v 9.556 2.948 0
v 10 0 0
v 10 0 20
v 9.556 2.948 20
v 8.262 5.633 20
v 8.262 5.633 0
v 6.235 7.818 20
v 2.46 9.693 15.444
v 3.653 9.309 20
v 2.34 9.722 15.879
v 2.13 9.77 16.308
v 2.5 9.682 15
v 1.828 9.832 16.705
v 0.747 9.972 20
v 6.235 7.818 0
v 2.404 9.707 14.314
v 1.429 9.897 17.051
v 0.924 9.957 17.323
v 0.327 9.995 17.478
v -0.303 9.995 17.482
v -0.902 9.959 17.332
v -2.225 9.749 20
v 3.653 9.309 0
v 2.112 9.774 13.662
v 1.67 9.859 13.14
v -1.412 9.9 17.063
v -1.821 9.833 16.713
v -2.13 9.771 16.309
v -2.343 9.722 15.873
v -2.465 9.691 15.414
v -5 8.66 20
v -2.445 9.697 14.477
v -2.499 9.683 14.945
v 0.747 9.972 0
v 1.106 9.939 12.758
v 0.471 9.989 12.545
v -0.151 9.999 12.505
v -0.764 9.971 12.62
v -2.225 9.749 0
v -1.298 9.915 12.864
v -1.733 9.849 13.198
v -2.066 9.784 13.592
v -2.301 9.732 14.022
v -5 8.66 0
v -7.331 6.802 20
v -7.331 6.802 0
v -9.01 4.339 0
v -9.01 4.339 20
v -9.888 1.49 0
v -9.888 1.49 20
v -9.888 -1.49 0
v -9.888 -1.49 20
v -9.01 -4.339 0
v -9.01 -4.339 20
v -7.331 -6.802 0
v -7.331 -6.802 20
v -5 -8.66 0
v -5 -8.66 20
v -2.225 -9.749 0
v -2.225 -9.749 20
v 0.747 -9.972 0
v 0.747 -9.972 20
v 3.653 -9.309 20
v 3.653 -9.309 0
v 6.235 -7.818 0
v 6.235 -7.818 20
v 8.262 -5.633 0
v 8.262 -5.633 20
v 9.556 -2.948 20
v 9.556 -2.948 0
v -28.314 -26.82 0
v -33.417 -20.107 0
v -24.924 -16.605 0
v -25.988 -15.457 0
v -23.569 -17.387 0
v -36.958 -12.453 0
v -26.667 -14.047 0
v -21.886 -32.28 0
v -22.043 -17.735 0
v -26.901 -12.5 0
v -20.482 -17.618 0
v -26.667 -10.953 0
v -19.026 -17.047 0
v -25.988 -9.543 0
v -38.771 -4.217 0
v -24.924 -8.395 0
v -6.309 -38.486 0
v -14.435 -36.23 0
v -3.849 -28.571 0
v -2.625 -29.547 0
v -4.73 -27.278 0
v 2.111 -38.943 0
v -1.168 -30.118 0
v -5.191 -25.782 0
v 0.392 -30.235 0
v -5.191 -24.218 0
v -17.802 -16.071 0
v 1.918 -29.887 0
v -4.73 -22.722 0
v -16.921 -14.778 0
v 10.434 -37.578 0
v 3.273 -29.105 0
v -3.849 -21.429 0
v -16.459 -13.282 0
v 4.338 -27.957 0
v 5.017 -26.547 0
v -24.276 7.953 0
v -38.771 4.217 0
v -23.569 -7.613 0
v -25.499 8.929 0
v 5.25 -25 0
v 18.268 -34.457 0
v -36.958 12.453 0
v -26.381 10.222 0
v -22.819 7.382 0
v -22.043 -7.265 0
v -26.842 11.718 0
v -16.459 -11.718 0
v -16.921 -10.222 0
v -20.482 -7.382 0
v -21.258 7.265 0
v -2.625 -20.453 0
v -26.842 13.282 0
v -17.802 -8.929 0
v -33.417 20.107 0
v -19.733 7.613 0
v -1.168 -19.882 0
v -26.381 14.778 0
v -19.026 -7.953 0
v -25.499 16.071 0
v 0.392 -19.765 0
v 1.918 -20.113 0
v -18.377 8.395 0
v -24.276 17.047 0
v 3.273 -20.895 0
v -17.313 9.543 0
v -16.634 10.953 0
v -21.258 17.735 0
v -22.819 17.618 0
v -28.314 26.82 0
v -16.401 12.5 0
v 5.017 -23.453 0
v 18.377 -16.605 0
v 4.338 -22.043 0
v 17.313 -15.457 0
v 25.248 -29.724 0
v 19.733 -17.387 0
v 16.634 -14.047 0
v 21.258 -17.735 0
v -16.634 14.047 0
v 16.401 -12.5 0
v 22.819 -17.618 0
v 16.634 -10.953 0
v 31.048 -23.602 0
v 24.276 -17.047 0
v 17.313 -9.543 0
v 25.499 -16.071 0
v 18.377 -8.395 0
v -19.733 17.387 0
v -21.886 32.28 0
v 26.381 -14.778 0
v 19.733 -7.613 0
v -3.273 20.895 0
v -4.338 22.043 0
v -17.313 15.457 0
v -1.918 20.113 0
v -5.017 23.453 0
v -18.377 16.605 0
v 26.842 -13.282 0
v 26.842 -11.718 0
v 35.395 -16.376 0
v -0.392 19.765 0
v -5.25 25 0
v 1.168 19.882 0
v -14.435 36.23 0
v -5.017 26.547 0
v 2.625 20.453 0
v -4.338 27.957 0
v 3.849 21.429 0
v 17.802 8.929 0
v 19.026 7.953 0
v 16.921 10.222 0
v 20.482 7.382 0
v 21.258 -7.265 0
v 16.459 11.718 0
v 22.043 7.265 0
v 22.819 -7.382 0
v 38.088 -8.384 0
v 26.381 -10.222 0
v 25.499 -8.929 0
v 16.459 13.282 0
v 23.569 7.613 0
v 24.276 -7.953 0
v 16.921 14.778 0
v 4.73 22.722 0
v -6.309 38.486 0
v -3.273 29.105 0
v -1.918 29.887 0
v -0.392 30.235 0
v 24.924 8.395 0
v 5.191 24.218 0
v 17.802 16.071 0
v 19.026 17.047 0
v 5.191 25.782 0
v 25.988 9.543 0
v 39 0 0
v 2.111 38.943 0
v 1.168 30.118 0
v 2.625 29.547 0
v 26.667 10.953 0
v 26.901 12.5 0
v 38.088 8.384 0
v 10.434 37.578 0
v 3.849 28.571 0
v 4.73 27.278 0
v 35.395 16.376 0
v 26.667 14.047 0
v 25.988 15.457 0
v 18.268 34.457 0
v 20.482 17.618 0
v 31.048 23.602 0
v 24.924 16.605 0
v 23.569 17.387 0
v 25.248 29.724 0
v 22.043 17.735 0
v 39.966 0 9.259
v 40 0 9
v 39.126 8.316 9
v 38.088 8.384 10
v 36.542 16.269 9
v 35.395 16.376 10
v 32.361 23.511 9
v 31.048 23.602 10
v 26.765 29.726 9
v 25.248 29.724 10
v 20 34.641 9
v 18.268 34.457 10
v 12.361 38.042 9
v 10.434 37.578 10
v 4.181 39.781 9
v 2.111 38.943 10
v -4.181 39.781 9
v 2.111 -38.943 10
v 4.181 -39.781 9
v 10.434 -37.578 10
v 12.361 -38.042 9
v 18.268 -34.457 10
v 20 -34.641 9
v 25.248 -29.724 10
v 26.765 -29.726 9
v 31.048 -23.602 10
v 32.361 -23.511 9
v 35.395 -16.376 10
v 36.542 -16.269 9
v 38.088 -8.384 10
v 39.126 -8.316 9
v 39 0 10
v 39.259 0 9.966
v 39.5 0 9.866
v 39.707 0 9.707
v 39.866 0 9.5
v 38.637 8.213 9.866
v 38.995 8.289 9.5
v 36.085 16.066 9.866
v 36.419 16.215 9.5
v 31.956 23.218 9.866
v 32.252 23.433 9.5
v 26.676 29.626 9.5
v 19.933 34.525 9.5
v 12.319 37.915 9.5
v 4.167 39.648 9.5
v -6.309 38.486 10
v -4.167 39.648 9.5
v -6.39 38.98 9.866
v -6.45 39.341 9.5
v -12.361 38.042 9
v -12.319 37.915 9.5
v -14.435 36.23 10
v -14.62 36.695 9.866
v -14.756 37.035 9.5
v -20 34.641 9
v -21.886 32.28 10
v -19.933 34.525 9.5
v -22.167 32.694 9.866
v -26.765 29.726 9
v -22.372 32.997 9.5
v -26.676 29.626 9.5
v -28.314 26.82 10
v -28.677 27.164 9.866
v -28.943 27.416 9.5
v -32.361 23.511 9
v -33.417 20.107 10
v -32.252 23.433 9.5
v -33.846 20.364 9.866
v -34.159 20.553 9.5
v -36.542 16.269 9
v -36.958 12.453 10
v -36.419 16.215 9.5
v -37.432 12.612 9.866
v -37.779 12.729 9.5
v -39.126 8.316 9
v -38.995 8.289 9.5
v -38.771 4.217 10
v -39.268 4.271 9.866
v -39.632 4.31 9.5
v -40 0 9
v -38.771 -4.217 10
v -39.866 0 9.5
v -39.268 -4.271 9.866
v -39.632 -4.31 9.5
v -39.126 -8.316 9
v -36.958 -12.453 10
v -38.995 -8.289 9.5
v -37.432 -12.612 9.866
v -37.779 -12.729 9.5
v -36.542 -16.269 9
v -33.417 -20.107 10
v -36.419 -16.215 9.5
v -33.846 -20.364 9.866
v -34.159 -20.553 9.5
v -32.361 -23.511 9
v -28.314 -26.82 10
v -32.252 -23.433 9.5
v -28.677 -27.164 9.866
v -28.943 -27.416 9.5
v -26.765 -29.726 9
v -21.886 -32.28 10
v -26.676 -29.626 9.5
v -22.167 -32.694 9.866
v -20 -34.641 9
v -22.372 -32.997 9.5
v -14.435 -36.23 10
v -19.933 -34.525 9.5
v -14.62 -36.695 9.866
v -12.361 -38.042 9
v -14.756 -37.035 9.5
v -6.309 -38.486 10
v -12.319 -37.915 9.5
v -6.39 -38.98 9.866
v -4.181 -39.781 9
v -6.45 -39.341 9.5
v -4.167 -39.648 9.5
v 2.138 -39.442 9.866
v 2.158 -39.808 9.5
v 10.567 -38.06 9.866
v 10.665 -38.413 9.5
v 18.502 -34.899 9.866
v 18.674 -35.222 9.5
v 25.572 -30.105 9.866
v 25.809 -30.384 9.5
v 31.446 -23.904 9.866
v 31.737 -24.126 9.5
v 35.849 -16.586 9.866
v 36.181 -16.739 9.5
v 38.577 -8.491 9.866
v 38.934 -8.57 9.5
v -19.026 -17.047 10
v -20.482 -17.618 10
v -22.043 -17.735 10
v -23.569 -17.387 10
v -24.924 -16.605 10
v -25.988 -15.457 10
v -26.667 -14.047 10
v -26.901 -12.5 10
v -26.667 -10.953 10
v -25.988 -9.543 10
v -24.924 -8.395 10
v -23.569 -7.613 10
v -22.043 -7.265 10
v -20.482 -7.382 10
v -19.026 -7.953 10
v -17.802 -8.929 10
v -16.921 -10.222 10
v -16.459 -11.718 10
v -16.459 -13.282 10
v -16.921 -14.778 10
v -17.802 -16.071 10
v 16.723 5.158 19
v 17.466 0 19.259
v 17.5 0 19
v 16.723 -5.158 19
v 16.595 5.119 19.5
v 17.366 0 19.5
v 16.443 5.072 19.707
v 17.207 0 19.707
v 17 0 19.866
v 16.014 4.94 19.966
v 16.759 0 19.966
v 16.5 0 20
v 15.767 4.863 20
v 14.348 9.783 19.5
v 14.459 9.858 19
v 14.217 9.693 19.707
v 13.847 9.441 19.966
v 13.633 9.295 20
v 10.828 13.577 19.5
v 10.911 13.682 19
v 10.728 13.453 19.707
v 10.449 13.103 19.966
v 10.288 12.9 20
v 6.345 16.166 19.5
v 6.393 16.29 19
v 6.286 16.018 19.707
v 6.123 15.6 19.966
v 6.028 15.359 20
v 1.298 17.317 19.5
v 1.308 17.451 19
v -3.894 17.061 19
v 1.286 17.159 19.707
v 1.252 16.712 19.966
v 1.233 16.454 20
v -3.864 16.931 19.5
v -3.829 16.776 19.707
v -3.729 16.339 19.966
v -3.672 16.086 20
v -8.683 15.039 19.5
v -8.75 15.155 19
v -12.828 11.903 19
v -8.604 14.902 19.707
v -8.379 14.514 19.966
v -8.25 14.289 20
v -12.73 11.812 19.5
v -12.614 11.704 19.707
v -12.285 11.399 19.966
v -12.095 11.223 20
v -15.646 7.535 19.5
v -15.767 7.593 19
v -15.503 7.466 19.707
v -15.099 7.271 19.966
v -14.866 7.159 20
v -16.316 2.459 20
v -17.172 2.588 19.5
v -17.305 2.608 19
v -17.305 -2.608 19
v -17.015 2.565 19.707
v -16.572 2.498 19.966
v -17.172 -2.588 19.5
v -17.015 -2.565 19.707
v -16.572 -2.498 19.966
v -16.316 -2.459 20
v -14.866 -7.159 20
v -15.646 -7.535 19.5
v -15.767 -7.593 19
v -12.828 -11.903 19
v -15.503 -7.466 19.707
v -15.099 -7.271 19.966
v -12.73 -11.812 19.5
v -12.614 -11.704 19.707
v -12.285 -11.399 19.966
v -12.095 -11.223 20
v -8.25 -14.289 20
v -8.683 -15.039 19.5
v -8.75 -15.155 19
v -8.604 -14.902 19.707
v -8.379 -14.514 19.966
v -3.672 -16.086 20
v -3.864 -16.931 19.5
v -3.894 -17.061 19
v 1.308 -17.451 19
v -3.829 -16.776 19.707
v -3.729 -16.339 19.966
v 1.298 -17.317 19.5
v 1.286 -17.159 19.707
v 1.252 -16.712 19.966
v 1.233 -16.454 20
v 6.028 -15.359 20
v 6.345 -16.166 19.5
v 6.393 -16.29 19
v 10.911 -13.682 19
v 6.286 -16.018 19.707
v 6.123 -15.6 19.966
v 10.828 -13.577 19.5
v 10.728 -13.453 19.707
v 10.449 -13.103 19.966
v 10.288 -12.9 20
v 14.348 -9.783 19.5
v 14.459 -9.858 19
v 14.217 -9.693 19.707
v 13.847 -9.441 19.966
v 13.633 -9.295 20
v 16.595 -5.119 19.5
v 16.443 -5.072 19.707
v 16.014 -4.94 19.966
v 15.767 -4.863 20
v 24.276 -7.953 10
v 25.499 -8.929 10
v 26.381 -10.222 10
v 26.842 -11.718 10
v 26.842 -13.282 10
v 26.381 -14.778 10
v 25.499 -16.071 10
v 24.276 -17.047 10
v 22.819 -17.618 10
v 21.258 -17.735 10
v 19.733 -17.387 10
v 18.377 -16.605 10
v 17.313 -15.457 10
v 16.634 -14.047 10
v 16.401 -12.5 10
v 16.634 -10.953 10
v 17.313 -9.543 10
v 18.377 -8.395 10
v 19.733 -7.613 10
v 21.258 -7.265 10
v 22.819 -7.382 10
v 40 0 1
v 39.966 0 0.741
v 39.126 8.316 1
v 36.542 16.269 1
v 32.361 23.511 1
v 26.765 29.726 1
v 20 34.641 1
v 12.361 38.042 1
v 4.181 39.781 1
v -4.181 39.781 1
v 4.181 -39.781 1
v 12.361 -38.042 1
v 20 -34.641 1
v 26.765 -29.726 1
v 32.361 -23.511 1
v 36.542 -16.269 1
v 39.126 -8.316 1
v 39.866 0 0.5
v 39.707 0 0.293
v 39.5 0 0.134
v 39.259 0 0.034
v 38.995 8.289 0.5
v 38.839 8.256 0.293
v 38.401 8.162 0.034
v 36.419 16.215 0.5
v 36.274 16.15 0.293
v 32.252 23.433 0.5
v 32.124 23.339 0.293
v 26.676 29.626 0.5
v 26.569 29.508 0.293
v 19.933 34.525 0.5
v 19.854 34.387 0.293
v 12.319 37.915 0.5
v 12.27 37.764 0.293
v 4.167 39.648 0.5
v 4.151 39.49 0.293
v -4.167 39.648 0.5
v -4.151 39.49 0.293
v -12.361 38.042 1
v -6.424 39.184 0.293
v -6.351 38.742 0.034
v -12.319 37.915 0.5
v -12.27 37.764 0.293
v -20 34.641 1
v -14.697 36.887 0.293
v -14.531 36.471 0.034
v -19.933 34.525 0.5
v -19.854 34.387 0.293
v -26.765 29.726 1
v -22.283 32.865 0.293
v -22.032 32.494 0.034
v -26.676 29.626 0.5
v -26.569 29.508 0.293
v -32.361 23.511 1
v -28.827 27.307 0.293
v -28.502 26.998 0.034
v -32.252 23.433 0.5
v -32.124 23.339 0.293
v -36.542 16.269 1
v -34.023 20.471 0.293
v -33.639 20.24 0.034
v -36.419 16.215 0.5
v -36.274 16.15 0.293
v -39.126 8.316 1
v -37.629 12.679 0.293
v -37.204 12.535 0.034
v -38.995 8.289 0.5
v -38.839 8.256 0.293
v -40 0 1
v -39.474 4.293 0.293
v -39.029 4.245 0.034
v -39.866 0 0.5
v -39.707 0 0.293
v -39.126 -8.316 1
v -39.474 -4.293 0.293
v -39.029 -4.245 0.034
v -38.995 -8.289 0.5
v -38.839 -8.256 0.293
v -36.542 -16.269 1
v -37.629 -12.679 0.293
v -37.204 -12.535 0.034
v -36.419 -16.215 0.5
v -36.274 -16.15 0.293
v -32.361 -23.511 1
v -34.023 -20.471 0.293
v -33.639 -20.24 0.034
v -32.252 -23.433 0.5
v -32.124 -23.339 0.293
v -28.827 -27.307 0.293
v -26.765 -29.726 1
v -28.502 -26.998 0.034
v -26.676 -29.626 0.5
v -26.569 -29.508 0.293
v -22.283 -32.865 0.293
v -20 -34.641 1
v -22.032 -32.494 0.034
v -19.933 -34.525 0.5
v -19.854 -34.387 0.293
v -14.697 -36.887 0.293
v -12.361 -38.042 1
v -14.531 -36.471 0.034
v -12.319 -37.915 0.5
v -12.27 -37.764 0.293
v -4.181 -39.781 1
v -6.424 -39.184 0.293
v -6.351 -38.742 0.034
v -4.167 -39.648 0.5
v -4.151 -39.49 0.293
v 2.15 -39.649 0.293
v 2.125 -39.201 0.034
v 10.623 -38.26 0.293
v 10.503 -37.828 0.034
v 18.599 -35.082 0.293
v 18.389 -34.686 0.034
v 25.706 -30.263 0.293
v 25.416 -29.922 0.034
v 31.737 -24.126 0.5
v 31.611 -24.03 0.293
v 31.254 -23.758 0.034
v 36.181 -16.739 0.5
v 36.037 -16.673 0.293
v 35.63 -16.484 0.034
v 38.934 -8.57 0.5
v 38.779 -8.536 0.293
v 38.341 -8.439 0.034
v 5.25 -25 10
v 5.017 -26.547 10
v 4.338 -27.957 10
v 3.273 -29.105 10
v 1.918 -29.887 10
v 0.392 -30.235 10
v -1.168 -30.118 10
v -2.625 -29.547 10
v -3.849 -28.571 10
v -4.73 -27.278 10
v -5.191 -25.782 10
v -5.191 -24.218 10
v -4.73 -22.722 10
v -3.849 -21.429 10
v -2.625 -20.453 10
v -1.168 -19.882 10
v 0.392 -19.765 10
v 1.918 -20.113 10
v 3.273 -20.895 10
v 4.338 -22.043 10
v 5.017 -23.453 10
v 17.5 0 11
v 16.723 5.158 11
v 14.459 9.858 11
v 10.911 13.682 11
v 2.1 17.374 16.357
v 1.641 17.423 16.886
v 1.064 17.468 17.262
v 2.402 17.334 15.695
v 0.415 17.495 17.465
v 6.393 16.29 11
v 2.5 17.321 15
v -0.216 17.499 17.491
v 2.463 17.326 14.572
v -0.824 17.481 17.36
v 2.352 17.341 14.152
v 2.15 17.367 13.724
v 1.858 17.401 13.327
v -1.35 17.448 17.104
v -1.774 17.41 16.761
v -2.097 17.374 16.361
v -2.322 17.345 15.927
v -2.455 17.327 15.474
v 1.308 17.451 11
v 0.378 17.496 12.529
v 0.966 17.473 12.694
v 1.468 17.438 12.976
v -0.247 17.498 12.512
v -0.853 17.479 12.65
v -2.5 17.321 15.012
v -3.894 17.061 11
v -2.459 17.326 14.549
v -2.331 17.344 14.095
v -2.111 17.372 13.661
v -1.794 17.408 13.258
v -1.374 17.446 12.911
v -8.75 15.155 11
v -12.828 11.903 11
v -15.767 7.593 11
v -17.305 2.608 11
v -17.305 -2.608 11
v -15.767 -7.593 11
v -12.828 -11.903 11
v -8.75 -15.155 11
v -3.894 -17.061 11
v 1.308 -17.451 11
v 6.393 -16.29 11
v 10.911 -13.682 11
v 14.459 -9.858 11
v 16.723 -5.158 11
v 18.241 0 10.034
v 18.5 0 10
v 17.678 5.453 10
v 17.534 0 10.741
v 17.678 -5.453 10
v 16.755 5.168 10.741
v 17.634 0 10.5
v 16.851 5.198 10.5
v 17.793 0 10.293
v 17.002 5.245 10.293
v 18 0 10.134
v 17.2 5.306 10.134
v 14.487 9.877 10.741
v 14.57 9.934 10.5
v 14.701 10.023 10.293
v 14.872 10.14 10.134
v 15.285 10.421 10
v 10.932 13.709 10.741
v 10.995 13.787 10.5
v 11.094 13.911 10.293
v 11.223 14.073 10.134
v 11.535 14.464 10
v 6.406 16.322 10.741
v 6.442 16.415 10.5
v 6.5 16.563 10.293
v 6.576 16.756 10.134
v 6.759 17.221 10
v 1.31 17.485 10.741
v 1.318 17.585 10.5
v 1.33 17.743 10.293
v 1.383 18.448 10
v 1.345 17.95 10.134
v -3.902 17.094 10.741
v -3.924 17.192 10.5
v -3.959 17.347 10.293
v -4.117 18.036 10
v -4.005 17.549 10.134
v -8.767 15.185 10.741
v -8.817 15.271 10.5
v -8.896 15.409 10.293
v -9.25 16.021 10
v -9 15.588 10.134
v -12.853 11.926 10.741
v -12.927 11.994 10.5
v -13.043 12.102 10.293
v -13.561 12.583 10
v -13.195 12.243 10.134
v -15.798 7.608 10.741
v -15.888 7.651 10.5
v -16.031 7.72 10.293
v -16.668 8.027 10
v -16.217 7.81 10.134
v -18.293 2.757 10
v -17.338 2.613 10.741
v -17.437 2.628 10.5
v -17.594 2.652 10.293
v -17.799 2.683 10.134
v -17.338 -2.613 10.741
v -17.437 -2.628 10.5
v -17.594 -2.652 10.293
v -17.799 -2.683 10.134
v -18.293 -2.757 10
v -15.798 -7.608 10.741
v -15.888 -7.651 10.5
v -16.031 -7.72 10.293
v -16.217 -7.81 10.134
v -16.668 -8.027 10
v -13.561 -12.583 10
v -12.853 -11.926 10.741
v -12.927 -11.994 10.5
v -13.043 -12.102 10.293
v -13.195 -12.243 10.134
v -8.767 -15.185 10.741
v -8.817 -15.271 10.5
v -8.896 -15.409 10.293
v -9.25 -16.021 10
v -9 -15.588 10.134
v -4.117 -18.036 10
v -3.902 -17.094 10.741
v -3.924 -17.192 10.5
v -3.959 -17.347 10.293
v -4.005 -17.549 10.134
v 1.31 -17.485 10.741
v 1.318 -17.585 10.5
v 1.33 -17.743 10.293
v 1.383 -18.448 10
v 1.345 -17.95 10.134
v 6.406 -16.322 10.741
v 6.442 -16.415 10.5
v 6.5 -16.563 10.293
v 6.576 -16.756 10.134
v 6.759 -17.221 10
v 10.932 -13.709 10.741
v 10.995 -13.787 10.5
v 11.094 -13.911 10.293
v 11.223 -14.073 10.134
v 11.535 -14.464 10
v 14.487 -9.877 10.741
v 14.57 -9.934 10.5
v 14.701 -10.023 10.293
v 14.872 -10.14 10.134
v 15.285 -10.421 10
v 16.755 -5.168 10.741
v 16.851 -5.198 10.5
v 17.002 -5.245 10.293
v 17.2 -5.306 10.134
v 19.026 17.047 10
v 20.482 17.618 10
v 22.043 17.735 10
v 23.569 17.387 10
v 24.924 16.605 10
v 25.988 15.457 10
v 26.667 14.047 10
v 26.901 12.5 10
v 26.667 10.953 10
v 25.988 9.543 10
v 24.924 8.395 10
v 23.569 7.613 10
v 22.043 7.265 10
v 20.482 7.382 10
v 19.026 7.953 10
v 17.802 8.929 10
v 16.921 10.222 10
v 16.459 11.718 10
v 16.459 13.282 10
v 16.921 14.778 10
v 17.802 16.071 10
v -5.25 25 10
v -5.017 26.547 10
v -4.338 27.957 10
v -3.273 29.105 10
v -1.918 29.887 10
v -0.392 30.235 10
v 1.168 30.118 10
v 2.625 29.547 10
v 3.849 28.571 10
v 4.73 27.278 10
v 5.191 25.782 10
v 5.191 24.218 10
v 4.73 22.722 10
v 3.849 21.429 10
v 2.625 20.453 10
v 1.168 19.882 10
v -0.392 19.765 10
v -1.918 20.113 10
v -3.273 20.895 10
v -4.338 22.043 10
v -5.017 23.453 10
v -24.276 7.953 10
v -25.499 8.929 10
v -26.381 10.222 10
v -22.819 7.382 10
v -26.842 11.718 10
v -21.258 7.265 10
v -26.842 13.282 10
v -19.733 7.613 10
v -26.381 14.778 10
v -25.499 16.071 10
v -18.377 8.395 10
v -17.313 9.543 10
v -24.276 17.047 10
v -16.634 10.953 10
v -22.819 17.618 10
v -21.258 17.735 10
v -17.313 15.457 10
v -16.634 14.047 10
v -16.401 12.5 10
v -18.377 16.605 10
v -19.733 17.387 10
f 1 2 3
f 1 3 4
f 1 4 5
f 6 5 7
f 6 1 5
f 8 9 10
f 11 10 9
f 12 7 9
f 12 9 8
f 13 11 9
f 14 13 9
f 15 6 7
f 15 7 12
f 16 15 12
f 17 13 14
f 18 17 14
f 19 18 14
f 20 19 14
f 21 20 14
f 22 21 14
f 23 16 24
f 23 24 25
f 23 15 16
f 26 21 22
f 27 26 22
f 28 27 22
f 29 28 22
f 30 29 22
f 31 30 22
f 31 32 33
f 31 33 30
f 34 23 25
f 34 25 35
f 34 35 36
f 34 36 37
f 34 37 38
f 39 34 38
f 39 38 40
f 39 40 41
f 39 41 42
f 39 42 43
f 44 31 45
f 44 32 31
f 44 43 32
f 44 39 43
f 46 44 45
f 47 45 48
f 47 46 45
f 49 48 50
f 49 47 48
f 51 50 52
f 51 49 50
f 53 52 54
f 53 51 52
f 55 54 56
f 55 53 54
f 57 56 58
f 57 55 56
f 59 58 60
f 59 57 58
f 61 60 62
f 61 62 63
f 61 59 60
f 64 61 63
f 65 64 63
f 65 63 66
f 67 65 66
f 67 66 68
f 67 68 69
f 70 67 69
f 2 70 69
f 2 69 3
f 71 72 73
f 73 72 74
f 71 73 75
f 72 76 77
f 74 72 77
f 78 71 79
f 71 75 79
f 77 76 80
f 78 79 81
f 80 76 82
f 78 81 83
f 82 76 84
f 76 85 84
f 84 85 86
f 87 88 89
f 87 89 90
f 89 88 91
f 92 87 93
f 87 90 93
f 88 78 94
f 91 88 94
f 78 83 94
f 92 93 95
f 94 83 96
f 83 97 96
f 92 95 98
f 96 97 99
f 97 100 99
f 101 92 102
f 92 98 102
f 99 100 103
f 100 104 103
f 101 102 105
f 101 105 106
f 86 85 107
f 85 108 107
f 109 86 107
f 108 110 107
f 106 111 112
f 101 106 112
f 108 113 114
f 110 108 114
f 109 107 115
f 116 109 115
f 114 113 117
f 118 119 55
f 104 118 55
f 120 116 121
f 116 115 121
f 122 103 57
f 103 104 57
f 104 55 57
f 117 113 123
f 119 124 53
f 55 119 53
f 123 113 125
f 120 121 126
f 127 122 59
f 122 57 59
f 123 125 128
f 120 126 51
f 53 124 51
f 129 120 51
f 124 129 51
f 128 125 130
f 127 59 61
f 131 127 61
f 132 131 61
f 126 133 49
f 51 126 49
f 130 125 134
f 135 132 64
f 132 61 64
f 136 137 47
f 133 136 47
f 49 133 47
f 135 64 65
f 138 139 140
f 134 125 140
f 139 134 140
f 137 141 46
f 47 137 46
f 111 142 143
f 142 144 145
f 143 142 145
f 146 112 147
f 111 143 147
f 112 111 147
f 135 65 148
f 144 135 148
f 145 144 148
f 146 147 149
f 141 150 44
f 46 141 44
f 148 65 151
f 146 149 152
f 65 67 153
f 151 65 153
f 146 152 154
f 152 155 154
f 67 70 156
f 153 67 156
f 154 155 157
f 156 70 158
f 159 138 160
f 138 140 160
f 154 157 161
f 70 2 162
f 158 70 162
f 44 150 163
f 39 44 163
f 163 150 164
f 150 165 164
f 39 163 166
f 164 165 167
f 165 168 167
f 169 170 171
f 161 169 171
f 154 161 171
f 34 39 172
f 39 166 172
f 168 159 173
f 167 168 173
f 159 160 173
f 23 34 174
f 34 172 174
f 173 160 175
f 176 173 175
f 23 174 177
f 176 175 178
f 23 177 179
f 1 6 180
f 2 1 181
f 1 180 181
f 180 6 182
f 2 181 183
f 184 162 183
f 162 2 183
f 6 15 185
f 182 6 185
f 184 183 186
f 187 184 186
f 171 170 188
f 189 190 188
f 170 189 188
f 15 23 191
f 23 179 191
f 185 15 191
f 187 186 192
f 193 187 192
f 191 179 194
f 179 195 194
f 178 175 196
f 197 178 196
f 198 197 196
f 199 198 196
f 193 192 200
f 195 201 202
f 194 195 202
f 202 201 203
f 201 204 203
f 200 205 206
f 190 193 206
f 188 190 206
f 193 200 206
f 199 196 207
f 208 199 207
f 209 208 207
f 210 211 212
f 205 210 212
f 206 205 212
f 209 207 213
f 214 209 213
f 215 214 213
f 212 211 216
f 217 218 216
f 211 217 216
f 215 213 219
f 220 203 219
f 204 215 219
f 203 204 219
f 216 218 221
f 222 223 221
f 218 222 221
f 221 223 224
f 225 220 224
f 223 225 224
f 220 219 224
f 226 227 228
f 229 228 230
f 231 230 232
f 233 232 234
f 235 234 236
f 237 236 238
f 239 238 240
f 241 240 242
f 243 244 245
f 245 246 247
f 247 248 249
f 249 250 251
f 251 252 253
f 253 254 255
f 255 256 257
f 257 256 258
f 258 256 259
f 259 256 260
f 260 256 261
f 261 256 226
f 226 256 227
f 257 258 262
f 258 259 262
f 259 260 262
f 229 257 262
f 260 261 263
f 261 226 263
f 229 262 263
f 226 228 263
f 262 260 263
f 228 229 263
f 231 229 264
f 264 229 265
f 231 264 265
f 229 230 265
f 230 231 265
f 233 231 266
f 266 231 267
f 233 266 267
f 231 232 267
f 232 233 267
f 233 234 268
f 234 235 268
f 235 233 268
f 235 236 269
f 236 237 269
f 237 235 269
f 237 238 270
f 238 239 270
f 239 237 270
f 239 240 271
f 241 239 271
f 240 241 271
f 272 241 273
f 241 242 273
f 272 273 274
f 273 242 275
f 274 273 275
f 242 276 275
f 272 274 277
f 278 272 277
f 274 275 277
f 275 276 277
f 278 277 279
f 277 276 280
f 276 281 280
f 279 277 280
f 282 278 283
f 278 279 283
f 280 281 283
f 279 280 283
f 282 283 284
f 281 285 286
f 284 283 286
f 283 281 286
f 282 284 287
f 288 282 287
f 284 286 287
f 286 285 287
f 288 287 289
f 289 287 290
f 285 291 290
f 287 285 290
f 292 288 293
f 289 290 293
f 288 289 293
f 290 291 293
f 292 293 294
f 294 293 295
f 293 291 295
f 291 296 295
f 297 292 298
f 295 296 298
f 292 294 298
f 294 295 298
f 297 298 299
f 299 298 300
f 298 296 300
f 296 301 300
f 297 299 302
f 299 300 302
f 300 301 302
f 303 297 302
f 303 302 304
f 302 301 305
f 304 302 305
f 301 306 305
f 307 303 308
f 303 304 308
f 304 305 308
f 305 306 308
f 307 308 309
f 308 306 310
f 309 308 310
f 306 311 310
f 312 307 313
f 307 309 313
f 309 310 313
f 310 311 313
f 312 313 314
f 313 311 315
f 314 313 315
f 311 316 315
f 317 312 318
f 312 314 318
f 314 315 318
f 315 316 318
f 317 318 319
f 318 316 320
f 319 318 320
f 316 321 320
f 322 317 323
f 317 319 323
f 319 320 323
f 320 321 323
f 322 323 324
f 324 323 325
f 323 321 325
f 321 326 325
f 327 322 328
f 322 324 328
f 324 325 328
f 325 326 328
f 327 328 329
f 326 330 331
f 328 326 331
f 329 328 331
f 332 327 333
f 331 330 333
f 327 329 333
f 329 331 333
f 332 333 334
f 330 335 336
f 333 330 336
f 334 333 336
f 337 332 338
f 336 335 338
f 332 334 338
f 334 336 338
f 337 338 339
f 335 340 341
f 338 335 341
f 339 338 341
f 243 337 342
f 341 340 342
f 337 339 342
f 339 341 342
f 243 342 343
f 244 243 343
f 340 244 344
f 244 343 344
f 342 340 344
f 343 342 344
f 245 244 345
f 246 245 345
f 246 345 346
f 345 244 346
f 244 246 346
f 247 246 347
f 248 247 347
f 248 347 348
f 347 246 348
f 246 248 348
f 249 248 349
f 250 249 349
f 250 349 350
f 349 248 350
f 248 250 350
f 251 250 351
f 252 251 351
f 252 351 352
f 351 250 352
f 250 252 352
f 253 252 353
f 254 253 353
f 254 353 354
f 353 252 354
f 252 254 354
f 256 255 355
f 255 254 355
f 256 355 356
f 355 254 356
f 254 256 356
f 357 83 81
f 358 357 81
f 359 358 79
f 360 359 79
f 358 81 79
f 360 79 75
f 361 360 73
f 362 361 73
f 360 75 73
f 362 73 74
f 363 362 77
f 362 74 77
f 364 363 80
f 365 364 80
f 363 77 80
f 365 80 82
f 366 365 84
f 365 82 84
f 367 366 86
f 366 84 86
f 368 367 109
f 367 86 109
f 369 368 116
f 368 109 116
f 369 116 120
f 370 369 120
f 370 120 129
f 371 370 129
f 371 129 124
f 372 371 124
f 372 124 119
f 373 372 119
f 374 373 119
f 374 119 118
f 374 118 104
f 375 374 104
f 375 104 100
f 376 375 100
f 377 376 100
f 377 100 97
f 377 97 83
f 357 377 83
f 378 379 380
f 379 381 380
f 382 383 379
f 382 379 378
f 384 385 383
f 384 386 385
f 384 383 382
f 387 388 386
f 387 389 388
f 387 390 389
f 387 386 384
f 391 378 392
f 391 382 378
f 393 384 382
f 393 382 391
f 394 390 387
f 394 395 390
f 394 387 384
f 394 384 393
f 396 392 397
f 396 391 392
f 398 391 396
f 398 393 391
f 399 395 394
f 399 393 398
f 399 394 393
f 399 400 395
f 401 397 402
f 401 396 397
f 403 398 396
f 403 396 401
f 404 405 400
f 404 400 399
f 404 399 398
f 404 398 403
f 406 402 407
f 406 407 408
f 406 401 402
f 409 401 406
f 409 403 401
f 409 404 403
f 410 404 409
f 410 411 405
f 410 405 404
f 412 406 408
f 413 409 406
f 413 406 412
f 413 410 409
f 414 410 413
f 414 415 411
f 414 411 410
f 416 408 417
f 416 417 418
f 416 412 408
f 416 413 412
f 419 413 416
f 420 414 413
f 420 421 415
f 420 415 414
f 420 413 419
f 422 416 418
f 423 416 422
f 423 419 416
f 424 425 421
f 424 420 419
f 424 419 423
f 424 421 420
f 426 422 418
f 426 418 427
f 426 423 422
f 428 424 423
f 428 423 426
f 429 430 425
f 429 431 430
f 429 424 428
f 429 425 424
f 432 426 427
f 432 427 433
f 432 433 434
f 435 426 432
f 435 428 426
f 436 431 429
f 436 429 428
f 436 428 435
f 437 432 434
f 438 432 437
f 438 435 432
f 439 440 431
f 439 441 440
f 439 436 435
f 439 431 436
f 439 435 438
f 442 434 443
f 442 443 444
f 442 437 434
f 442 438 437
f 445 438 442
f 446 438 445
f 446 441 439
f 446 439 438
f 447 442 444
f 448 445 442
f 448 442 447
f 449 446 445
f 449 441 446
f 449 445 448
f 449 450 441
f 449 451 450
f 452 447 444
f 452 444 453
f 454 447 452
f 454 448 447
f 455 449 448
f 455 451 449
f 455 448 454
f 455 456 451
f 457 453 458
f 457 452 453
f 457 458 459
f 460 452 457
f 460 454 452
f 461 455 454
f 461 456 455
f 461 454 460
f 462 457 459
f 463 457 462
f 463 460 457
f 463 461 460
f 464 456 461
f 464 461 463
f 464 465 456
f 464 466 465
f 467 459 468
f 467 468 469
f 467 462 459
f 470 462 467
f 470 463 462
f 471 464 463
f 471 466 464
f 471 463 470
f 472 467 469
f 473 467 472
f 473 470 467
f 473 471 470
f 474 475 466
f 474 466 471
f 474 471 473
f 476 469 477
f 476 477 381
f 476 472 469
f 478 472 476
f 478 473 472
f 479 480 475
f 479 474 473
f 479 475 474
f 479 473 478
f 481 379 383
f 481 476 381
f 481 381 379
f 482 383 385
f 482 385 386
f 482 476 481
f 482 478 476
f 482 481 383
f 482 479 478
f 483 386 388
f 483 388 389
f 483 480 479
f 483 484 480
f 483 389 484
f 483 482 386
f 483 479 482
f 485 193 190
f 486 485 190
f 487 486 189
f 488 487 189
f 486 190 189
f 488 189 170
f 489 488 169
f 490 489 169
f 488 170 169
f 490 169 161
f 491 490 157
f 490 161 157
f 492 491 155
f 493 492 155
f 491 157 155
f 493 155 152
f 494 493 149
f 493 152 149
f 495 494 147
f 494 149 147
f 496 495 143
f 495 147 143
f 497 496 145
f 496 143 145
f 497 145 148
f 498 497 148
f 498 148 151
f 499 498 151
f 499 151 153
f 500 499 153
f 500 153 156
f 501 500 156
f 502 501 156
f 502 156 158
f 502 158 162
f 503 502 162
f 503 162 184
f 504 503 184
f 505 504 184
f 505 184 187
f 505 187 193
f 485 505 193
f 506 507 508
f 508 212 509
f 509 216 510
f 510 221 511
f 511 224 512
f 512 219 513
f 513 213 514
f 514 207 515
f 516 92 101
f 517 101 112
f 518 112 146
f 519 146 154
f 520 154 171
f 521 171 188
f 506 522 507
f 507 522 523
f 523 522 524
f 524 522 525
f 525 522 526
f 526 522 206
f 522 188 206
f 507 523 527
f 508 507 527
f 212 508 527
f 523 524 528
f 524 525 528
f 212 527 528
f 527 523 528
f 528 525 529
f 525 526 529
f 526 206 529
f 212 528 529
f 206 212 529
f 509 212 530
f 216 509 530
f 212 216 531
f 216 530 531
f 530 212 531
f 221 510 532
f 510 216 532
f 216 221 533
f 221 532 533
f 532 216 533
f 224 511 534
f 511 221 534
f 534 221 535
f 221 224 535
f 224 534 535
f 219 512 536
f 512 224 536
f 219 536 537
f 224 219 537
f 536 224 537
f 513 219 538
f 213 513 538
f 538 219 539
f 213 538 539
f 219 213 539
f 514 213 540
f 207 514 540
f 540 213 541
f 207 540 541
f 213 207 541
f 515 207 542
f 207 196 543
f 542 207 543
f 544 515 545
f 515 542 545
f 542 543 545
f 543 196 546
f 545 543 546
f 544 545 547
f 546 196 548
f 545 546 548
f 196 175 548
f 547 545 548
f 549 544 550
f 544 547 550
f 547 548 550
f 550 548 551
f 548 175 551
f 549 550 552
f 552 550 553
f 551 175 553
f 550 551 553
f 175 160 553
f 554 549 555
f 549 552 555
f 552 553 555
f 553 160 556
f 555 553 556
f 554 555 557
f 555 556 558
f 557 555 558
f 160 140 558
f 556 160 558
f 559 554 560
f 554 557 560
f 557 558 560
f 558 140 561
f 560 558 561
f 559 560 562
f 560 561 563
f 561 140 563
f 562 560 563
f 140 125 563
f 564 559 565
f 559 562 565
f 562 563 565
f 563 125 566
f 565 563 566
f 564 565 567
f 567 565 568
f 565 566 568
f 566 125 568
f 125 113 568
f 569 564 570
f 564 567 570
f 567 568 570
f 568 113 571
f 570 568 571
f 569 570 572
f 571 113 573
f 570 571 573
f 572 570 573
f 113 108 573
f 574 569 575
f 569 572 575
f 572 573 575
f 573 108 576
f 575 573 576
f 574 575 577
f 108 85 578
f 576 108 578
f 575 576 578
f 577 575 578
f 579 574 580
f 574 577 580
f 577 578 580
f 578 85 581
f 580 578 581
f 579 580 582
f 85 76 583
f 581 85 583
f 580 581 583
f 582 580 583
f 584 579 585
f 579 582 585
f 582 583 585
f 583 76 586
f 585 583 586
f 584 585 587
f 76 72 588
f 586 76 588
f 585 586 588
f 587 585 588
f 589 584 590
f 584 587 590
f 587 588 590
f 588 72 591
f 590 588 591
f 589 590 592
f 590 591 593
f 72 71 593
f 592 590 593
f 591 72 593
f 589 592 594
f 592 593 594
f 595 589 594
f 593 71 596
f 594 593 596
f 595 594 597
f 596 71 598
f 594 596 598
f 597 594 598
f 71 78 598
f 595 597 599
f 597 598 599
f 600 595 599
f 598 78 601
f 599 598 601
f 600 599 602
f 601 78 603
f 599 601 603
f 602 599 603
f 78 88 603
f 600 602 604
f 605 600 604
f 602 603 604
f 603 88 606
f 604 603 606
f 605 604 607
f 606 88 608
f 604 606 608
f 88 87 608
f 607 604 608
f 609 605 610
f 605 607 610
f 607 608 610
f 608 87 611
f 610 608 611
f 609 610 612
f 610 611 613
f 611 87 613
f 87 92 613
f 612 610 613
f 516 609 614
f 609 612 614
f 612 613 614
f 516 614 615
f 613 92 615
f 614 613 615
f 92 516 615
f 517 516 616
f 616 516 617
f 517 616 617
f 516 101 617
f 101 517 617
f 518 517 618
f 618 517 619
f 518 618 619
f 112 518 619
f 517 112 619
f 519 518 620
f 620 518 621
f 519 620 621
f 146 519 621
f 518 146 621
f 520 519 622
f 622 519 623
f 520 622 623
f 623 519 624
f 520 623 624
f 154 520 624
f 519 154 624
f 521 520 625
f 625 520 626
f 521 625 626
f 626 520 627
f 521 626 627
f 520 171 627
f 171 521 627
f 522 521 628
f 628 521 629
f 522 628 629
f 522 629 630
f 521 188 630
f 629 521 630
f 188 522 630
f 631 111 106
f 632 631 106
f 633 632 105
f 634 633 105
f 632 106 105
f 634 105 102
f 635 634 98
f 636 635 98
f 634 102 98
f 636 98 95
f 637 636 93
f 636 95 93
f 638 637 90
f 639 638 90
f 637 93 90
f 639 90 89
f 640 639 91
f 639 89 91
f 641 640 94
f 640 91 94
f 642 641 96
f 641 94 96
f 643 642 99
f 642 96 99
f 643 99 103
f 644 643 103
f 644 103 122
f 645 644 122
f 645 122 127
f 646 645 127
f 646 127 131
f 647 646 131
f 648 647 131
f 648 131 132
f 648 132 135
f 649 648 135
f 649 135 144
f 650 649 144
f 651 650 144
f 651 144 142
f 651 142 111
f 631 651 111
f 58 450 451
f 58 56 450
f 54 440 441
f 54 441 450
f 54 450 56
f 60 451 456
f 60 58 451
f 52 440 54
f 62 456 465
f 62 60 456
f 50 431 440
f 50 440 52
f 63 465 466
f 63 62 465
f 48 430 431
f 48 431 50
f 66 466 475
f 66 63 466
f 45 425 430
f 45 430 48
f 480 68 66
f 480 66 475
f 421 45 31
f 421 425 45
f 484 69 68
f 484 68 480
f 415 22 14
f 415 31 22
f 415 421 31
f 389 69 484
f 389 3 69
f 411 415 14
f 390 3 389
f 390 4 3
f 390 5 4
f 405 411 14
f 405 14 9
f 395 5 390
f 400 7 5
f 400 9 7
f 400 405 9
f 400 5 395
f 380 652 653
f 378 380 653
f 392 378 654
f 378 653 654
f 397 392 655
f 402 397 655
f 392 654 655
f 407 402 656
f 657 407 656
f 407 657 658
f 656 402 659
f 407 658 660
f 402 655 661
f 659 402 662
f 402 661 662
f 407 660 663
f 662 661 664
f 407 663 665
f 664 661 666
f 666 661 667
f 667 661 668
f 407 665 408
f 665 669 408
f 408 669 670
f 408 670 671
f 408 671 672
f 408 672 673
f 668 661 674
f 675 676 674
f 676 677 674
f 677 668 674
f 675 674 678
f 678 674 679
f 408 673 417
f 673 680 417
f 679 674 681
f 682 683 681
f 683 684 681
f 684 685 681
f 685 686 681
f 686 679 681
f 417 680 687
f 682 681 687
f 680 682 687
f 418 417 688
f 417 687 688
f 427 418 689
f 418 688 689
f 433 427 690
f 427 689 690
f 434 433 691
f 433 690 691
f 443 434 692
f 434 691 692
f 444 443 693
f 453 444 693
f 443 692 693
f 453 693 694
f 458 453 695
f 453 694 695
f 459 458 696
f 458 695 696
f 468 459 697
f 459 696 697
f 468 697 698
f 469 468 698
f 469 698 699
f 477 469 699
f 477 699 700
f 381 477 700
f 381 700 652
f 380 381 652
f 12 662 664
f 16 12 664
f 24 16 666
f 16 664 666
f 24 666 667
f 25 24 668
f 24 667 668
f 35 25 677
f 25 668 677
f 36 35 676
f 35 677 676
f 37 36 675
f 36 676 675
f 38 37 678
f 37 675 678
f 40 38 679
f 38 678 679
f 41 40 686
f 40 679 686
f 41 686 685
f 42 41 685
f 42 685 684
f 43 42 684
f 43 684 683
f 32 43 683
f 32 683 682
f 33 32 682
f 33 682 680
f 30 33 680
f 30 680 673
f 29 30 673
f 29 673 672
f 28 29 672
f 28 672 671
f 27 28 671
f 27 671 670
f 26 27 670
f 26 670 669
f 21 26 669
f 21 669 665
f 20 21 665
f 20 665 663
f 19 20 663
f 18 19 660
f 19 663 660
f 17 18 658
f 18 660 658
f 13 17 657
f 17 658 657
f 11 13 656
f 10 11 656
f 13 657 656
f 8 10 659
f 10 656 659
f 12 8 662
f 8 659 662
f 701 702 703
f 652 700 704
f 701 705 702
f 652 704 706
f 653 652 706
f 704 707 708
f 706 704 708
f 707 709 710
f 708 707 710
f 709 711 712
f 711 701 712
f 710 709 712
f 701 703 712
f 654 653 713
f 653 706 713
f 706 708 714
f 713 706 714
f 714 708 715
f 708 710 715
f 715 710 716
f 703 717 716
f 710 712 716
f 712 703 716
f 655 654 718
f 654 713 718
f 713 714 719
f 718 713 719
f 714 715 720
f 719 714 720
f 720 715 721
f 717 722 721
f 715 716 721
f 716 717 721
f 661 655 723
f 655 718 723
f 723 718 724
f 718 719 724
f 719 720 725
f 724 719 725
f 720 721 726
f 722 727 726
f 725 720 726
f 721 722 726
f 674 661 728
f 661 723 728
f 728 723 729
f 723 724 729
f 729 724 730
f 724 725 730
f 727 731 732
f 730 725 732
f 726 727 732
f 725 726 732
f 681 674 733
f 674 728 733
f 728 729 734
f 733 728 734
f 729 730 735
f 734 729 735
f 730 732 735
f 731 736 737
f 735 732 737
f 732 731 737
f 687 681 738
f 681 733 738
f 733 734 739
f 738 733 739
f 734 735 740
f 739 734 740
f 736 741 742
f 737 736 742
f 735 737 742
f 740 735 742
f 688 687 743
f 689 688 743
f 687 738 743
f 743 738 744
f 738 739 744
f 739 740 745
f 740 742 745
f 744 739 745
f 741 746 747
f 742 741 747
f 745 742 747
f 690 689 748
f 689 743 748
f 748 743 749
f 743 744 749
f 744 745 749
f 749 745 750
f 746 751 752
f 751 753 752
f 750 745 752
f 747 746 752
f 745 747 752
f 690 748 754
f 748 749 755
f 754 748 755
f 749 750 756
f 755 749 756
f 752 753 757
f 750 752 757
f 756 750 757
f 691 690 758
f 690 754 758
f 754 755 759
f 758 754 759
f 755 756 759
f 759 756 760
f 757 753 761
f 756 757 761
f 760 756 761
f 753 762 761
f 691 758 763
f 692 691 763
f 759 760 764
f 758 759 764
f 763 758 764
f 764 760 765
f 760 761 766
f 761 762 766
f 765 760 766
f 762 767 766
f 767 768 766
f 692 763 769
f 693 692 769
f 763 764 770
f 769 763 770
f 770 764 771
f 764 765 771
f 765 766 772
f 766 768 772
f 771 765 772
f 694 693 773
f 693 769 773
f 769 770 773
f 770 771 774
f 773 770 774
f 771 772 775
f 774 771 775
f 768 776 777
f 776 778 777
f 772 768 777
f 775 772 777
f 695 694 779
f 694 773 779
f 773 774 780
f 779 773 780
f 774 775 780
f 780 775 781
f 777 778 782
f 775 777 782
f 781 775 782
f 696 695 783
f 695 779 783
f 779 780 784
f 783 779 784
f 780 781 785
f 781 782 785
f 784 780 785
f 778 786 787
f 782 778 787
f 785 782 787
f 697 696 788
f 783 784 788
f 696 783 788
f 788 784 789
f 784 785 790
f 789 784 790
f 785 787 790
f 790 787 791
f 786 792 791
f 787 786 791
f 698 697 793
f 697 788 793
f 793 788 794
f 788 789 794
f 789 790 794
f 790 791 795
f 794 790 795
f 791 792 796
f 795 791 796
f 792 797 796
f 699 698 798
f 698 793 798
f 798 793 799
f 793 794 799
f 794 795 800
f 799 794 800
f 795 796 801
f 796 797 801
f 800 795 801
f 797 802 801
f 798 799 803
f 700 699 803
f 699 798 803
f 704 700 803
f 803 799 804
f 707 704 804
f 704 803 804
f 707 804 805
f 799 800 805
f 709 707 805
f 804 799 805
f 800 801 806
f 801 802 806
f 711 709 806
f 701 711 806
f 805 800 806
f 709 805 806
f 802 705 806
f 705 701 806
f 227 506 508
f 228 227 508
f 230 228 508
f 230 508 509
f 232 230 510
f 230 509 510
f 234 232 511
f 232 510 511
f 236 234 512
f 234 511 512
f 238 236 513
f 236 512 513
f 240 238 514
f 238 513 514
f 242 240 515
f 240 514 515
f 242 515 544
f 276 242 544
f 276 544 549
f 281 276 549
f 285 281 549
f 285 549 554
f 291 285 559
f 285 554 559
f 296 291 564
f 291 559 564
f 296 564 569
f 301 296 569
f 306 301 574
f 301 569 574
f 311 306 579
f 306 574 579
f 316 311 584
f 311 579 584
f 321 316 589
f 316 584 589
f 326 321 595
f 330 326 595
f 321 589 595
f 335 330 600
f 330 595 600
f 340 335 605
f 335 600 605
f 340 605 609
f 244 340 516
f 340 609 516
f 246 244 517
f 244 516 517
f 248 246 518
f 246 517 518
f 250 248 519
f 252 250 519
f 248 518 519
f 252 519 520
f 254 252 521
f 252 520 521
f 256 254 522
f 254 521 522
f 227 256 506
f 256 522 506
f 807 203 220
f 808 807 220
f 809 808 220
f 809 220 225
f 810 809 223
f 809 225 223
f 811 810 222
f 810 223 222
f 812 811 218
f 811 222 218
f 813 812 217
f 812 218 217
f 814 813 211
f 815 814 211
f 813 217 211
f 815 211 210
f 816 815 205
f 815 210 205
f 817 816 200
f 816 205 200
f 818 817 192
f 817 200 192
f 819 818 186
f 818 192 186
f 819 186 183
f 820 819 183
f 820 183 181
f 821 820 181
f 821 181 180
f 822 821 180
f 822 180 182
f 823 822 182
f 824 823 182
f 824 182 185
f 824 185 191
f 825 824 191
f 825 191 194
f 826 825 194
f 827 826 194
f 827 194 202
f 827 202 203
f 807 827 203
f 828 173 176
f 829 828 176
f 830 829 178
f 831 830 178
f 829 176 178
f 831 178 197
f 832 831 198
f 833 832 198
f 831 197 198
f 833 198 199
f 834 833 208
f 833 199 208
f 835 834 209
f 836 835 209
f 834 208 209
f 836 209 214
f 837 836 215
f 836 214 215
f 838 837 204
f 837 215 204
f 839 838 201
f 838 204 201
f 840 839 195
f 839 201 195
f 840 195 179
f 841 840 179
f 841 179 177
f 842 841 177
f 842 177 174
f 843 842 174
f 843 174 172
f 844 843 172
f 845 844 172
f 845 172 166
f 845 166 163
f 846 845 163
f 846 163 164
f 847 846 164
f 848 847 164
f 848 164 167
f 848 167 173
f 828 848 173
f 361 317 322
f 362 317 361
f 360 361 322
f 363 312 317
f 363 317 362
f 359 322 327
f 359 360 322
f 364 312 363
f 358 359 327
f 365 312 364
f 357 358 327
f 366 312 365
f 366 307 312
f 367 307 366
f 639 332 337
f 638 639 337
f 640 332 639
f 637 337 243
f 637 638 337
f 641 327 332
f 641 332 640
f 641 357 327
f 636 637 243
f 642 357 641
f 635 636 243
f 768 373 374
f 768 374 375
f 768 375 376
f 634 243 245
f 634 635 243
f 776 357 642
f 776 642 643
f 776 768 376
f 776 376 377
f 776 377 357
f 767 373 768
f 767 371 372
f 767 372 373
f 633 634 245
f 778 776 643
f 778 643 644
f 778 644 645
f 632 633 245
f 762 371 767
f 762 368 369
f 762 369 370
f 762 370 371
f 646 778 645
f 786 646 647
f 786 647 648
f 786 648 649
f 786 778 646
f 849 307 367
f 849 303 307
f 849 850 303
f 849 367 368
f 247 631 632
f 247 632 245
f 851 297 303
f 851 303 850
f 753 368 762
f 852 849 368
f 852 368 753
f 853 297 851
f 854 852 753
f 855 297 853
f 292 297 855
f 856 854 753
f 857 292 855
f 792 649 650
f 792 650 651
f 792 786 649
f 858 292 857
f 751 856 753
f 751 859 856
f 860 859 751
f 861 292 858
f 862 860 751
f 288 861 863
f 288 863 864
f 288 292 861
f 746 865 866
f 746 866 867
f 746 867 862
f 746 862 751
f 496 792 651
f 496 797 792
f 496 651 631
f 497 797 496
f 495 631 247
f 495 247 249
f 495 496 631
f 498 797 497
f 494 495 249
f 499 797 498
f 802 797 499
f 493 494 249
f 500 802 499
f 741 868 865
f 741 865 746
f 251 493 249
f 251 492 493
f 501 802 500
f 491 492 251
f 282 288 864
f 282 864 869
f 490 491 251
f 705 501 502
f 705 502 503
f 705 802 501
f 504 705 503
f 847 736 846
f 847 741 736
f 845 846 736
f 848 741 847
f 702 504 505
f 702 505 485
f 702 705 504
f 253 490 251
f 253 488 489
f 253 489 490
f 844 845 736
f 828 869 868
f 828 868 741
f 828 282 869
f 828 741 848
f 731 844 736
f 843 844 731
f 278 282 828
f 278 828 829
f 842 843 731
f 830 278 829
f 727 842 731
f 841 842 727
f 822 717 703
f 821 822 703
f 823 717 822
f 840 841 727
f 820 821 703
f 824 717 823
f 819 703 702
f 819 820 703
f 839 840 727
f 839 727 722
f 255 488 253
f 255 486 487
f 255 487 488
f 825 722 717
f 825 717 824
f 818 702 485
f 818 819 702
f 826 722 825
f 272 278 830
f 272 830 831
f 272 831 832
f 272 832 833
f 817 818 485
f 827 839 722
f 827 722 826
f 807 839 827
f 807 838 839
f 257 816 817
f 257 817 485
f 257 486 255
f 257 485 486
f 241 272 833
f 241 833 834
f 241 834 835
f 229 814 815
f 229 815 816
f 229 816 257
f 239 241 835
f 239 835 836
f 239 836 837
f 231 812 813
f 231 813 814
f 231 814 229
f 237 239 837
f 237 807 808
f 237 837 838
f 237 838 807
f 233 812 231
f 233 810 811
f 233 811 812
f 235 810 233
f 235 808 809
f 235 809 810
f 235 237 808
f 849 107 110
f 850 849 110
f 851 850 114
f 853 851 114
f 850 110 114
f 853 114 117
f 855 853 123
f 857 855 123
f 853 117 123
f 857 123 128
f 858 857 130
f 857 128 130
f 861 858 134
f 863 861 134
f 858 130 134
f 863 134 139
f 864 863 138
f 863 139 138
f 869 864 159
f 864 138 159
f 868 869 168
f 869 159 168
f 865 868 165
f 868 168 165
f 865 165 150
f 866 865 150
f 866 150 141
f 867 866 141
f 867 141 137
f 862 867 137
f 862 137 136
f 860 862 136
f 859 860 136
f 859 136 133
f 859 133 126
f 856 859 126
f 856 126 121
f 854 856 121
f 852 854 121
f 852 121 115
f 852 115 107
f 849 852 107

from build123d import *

# Parameters (mm, degrees)
SKETCH1_R                  = 40
SKETCH1_R_2                = 10
BOSS_EXTRUDE1_DEPTH        = 10
M12X1_5_TAPPED_HOLE1_D     = 10.5
CIRPATTERN1_COUNT          = 6
SKETCH5_R                  = 17.5
SKETCH5_R_2                = 10
BOSS_EXTRUDE2_DEPTH        = 10
M6X1_0_TAPPED_HOLE1_REACH  = 74.844
M6X1_0_TAPPED_HOLE1_BORE_R = 2.5
FILLET1_R                  = 1


with BuildPart() as part:
    # Sketch1 → Boss-Extrude1 (new body)
    with BuildSketch(Plane.XY):
        Circle(SKETCH1_R)
        Circle(SKETCH1_R_2, mode=Mode.SUBTRACT)
    extrude(amount=BOSS_EXTRUDE1_DEPTH)

    # M12x1.5 Tapped Hole1 (through all)
    with Locations(Plane.XY.offset(10)):
        with Locations((0, 25)):
            m12x1_5_tapped_hole1 = Hole(M12X1_5_TAPPED_HOLE1_D / 2)

    # CirPattern1: M12x1.5 Tapped Hole1 ×6 about axis
    cirpattern1_axis = Axis((0, 0, 0), (0, 0, 1))
    for i in range(1, CIRPATTERN1_COUNT):
        add(m12x1_5_tapped_hole1.rotate(cirpattern1_axis, i * 360 / CIRPATTERN1_COUNT), mode=Mode.SUBTRACT)

    # Sketch5 → Boss-Extrude2 (add)
    with BuildSketch(Plane.XY.offset(10)):
        Circle(SKETCH5_R)
        Circle(SKETCH5_R_2, mode=Mode.SUBTRACT)
    extrude(amount=BOSS_EXTRUDE2_DEPTH)

    # M6x1.0 Tapped Hole1 bore → M6x1.0 Tapped Hole1 (cut, up to next)
    with BuildSketch(Plane(origin=(0, 17.5, 0), x_dir=(1, 0, 0), z_dir=(0, 1, 0)), mode=Mode.PRIVATE) as m6x1_0_tapped_hole1_sk1:
        with Locations((0, -15)):
            Circle(M6X1_0_TAPPED_HOLE1_BORE_R)
    m6x1_0_tapped_hole1_tool1 = extrude(m6x1_0_tapped_hole1_sk1.sketch, amount=-M6X1_0_TAPPED_HOLE1_REACH, mode=Mode.PRIVATE) & part.part
    add(m6x1_0_tapped_hole1_tool1.solids().sort_by_distance((0, 17.5, 15))[0], mode=Mode.SUBTRACT)

    # Fillet1
    fillet1_edges = [part.edges().sort_by_distance(p)[0] for p in [
        (-40, 0, 0),
        (-17.5, 0, 10),
        (-17.5, 0, 20),
        (-40, 0, 10),
    ]]
    fillet(fillet1_edges, radius=FILLET1_R)


solid = part.part
